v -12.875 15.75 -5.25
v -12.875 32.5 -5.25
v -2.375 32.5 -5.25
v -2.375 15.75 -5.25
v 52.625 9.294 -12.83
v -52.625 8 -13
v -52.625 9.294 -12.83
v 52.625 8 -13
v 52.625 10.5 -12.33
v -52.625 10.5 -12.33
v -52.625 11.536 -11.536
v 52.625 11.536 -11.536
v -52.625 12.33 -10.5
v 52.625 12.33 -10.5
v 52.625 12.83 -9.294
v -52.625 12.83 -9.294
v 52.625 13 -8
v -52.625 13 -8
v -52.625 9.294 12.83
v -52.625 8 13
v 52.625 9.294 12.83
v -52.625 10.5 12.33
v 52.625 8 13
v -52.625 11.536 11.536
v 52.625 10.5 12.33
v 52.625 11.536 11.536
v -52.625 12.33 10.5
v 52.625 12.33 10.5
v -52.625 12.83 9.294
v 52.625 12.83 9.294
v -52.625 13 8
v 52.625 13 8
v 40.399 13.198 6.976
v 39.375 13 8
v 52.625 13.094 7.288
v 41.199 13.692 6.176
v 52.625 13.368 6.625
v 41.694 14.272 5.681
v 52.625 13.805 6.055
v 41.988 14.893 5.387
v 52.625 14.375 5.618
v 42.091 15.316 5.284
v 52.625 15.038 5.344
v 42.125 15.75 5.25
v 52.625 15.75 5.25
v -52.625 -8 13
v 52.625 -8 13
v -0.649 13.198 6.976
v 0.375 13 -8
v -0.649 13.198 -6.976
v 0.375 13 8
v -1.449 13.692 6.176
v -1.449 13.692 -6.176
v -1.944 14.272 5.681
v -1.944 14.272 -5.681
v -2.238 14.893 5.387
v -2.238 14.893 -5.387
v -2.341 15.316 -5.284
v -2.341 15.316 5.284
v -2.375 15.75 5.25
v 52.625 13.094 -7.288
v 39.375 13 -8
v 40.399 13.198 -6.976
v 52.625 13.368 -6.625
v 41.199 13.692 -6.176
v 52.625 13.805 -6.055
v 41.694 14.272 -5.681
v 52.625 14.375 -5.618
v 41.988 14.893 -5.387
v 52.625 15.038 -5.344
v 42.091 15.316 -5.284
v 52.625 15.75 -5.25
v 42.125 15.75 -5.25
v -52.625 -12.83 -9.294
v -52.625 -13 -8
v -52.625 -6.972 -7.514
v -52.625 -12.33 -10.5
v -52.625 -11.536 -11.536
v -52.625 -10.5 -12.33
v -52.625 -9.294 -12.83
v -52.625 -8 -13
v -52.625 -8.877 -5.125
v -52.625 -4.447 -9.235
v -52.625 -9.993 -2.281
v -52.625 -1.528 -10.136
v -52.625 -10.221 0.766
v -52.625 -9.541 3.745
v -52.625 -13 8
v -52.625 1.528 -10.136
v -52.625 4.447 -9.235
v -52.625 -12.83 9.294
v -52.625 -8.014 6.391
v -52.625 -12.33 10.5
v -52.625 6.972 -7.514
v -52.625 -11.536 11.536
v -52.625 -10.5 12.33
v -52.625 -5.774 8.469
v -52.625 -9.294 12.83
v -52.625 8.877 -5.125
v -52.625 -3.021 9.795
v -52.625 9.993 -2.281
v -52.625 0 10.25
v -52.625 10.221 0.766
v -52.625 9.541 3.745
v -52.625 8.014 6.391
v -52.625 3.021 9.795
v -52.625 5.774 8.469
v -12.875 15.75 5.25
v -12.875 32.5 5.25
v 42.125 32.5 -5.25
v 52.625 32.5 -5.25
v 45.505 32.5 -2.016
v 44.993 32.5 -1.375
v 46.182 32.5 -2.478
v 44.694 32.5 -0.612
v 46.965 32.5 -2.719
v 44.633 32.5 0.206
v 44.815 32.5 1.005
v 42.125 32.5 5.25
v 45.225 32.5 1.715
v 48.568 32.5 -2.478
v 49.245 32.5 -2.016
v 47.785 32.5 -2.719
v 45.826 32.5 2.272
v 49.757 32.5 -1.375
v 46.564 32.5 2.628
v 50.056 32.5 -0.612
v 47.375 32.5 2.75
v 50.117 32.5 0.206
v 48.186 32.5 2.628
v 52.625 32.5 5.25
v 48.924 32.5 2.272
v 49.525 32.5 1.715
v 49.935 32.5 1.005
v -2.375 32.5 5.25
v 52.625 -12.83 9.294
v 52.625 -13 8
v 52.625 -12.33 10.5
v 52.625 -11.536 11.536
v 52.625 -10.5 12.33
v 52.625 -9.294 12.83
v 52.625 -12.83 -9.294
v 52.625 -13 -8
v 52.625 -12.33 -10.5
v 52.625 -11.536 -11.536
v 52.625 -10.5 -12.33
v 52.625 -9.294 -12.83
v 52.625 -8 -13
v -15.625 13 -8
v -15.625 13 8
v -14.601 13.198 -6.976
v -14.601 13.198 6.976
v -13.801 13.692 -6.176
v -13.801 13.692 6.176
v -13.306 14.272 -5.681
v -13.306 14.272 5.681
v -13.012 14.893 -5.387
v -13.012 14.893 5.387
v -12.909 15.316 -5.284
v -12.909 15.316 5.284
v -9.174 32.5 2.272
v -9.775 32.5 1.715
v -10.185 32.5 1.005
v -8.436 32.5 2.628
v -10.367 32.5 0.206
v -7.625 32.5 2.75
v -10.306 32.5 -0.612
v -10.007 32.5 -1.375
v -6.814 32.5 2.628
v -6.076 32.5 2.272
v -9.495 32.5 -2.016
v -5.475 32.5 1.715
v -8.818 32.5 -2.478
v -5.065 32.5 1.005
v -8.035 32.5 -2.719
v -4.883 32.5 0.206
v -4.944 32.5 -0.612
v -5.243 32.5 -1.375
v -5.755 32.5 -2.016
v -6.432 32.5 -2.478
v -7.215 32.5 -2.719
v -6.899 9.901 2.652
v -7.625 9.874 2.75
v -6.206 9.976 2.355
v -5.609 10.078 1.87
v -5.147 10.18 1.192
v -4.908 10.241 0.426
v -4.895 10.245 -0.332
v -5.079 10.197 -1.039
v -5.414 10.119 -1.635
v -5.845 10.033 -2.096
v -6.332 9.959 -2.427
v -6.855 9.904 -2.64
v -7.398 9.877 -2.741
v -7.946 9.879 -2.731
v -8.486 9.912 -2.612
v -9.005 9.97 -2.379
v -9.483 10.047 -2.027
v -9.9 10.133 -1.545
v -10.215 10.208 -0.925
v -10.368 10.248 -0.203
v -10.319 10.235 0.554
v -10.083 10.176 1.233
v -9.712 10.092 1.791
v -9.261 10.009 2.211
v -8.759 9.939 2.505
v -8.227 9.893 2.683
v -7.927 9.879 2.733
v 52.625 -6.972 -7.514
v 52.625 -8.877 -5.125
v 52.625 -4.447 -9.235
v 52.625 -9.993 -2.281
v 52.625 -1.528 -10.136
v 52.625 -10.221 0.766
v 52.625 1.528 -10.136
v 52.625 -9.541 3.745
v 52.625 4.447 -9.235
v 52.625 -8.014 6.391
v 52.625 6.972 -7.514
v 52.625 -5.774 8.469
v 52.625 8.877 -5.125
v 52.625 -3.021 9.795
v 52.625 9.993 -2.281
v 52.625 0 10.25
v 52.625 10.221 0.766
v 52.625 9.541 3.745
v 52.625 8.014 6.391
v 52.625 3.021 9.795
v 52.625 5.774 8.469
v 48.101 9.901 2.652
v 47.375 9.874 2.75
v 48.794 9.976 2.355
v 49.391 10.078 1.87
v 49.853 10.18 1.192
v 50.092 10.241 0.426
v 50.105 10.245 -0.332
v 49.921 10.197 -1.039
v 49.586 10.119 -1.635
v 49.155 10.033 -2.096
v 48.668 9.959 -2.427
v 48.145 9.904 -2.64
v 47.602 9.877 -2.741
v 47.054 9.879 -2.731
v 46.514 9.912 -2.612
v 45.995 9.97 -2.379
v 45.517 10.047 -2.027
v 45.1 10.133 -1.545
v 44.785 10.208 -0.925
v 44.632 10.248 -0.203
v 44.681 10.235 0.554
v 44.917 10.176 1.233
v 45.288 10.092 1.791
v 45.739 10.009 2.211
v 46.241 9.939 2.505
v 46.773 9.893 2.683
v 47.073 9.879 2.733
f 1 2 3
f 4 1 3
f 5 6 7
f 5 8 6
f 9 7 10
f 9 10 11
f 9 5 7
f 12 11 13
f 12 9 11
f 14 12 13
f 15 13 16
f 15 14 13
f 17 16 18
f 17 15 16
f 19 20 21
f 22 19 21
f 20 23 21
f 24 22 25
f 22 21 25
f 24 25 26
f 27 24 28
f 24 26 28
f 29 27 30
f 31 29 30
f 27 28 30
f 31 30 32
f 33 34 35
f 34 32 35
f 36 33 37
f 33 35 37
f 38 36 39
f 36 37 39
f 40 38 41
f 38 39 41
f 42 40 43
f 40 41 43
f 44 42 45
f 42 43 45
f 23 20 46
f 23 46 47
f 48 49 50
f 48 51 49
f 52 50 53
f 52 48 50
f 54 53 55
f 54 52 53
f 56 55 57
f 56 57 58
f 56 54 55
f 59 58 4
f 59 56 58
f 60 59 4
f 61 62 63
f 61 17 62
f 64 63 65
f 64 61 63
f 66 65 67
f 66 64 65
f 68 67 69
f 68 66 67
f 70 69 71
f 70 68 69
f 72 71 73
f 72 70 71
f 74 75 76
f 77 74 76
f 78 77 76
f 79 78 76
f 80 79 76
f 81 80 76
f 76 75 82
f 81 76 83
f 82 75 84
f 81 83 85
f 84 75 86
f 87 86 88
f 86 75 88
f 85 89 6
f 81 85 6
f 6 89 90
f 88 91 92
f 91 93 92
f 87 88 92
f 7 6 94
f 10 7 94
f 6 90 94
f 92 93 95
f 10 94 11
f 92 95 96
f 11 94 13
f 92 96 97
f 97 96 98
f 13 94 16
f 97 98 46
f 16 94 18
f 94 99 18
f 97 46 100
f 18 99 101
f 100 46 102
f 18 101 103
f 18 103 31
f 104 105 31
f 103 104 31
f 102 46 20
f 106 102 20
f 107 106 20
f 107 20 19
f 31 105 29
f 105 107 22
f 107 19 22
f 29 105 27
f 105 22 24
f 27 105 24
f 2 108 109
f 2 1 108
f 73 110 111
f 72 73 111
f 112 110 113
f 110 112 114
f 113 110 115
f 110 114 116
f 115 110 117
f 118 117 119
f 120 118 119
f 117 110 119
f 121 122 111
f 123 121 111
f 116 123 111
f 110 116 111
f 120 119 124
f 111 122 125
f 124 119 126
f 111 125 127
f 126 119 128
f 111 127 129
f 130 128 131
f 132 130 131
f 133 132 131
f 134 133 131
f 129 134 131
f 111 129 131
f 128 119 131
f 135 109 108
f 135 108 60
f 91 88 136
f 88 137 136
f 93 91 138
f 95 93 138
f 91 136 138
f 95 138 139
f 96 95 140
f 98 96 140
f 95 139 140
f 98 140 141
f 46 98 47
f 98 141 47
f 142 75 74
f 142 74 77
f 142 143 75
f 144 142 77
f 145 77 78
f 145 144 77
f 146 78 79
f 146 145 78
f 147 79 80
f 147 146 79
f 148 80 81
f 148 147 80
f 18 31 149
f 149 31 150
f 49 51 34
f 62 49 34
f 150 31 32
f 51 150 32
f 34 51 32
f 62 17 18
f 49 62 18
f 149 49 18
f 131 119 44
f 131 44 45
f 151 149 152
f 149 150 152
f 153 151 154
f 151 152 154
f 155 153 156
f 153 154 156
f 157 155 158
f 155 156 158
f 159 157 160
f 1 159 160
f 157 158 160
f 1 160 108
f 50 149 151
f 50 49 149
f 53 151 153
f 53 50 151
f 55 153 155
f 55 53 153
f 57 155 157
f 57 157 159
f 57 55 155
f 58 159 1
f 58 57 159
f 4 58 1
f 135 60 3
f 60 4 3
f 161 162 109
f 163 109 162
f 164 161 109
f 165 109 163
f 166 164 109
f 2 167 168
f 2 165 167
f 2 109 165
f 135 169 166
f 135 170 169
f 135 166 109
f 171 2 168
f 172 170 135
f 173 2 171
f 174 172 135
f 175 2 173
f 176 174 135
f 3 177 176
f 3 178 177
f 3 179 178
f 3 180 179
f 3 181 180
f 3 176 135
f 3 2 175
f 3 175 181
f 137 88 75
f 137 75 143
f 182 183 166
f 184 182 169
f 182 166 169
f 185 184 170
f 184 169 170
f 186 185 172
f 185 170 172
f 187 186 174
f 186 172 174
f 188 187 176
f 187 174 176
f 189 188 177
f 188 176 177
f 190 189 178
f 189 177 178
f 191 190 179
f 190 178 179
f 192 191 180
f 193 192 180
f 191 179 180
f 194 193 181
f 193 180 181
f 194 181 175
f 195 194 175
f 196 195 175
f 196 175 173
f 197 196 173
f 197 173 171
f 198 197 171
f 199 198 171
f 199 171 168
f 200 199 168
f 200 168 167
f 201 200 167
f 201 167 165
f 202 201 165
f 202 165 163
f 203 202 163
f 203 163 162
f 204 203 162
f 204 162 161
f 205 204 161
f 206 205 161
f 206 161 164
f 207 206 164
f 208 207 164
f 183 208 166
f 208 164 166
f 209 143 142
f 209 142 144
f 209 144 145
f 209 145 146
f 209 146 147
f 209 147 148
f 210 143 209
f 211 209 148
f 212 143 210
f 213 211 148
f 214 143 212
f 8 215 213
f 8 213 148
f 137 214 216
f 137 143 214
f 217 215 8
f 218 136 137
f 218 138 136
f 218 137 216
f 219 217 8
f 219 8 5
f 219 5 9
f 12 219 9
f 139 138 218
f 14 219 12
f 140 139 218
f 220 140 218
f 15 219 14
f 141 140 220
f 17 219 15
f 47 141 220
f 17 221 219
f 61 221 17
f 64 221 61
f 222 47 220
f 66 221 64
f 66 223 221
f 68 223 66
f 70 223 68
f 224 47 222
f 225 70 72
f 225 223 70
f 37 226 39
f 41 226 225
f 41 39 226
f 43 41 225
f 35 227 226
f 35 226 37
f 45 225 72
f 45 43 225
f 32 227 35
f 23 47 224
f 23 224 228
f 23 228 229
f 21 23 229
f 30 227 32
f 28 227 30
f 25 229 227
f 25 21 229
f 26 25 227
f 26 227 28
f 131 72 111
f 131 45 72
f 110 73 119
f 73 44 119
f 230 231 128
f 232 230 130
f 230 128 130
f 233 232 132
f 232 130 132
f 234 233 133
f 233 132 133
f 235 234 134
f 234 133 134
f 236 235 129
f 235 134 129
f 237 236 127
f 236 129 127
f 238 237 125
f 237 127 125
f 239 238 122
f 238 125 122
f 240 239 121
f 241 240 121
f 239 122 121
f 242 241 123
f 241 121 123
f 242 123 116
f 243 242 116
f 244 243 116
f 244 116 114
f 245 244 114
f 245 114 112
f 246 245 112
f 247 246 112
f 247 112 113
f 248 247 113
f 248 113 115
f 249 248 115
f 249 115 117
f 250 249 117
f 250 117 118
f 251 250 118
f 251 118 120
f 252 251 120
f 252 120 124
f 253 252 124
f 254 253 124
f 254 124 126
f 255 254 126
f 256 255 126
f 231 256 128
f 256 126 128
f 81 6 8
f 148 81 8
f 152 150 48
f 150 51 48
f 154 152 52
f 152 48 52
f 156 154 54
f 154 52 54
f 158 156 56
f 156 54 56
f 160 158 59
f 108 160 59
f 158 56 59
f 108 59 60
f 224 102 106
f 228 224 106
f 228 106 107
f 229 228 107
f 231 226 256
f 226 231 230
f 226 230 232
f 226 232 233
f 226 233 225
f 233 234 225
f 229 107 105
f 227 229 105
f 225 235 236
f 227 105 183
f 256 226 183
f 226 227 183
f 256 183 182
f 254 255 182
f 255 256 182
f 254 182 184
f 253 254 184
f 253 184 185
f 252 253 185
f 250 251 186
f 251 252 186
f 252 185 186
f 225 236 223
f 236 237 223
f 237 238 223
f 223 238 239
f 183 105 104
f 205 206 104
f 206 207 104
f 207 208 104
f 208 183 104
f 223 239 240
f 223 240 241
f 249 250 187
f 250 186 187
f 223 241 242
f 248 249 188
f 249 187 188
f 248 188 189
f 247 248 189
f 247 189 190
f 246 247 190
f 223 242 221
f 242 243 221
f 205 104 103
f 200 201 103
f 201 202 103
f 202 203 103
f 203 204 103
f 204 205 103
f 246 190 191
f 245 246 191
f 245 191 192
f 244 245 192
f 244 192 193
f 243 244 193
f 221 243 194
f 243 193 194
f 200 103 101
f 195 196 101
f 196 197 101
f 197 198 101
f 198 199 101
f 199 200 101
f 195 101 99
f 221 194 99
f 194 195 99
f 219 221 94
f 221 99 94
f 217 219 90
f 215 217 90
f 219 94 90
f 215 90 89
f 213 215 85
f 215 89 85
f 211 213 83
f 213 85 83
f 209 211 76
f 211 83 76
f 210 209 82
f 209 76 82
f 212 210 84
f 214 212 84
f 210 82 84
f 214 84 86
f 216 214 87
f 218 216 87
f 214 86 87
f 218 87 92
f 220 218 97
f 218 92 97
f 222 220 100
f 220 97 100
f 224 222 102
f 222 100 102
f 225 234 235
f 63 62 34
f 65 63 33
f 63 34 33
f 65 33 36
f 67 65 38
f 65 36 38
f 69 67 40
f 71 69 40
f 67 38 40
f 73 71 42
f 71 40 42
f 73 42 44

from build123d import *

# Parameters (mm, degrees)
SKETCH1_W               = 105.25
SKETCH1_H               = 26
BOSS_EXTRUDE1_DEPTH     = 13
SKETCH1_3_W             = 10.5
SKETCH1_3_H             = 19.5
BOSS_EXTRUDE2_DEPTH     = 5.25
SKETCH2_R               = 10.25
CUT_EXTRUDE1_DEPTH      = 111.918044069
CUT_EXTRUDE2_REACH      = 72.772
CUT_EXTRUDE2_END_RADIUS = 10.25
SKETCH3_R               = 2.75
FILLET1_R               = 5
FILLET4_R               = 2.75


with BuildPart() as part:
    # Sketch1 → Boss-Extrude1 (new, symmetric)
    with BuildSketch(Plane.XY):
        Rectangle(SKETCH1_W, SKETCH1_H)
    extrude(amount=BOSS_EXTRUDE1_DEPTH, both=True)

    # Sketch1<3> → Boss-Extrude2 (add, symmetric)
    with BuildSketch(Plane.XY):
        with Locations((-7.625, 22.75)):
            Rectangle(SKETCH1_3_W, SKETCH1_3_H)
        with Locations((47.375, 22.75)):
            Rectangle(SKETCH1_3_W, SKETCH1_3_H)
    extrude(amount=BOSS_EXTRUDE2_DEPTH, both=True)

    # Sketch2 → Cut-Extrude1 (cut, through all)
    with BuildSketch(Plane.ZY.offset(52.625)):
        Circle(SKETCH2_R)
    extrude(amount=-CUT_EXTRUDE1_DEPTH, mode=Mode.SUBTRACT)

    # Cut-Extrude2: up to this cylinder (the profile starts outside it)
    cut_extrude2_end = Plane(origin=(19.875, 0, 0), z_dir=(-1, 0, 0)) * Cylinder(CUT_EXTRUDE2_END_RADIUS, 222.044, mode=Mode.PRIVATE)
    # Sketch3 → Cut-Extrude2 (cut, up to the surface)
    with BuildSketch(Plane(origin=(0, 32.5, 0), x_dir=(1, 0, 0), z_dir=(0, 1, 0)), mode=Mode.PRIVATE) as cut_extrude2_sk1:
        with Locations(Location((-7.625, 0, 0), (0, 0, 270))):
            Circle(SKETCH3_R)
    cut_extrude2_tool1 = extrude(cut_extrude2_sk1.sketch, amount=-CUT_EXTRUDE2_REACH, mode=Mode.PRIVATE) - cut_extrude2_end
    add(cut_extrude2_tool1.solids().sort_by_distance((-7.625, 32.5, 0))[0], mode=Mode.SUBTRACT)
    # Sketch3 → Cut-Extrude2 (cut, up to the surface)
    with BuildSketch(Plane(origin=(0, 32.5, 0), x_dir=(1, 0, 0), z_dir=(0, 1, 0)), mode=Mode.PRIVATE) as cut_extrude2_sk2:
        with Locations(Location((47.375, 0, 0), (0, 0, 270))):
            Circle(SKETCH3_R)
    cut_extrude2_tool2 = extrude(cut_extrude2_sk2.sketch, amount=-CUT_EXTRUDE2_REACH, mode=Mode.PRIVATE) - cut_extrude2_end
    add(cut_extrude2_tool2.solids().sort_by_distance((47.375, 32.5, 0))[0], mode=Mode.SUBTRACT)

    # Fillet1
    fillet1_edges = [part.edges().sort_by_distance(p)[0] for p in [
        (0, 13, 13),
        (0, -13, 13),
        (0, -13, -13),
        (0, 13, -13),
    ]]
    fillet(fillet1_edges, radius=FILLET1_R)

    # Fillet4
    fillet4_edges = [part.edges().sort_by_distance(p)[0] for p in [
        (-12.875, 13, 0),
        (42.125, 13, 0),
        (-2.375, 13, 0),
        (47.375, 13, -5.25),
        (47.375, 13, 5.25),
        (-7.625, 13, 5.25),
        (-7.625, 13, -5.25),
    ]]
    fillet(fillet4_edges, radius=FILLET4_R - 0.0001)  # a hair under: the kernel refuses the full size


solid = part.part
